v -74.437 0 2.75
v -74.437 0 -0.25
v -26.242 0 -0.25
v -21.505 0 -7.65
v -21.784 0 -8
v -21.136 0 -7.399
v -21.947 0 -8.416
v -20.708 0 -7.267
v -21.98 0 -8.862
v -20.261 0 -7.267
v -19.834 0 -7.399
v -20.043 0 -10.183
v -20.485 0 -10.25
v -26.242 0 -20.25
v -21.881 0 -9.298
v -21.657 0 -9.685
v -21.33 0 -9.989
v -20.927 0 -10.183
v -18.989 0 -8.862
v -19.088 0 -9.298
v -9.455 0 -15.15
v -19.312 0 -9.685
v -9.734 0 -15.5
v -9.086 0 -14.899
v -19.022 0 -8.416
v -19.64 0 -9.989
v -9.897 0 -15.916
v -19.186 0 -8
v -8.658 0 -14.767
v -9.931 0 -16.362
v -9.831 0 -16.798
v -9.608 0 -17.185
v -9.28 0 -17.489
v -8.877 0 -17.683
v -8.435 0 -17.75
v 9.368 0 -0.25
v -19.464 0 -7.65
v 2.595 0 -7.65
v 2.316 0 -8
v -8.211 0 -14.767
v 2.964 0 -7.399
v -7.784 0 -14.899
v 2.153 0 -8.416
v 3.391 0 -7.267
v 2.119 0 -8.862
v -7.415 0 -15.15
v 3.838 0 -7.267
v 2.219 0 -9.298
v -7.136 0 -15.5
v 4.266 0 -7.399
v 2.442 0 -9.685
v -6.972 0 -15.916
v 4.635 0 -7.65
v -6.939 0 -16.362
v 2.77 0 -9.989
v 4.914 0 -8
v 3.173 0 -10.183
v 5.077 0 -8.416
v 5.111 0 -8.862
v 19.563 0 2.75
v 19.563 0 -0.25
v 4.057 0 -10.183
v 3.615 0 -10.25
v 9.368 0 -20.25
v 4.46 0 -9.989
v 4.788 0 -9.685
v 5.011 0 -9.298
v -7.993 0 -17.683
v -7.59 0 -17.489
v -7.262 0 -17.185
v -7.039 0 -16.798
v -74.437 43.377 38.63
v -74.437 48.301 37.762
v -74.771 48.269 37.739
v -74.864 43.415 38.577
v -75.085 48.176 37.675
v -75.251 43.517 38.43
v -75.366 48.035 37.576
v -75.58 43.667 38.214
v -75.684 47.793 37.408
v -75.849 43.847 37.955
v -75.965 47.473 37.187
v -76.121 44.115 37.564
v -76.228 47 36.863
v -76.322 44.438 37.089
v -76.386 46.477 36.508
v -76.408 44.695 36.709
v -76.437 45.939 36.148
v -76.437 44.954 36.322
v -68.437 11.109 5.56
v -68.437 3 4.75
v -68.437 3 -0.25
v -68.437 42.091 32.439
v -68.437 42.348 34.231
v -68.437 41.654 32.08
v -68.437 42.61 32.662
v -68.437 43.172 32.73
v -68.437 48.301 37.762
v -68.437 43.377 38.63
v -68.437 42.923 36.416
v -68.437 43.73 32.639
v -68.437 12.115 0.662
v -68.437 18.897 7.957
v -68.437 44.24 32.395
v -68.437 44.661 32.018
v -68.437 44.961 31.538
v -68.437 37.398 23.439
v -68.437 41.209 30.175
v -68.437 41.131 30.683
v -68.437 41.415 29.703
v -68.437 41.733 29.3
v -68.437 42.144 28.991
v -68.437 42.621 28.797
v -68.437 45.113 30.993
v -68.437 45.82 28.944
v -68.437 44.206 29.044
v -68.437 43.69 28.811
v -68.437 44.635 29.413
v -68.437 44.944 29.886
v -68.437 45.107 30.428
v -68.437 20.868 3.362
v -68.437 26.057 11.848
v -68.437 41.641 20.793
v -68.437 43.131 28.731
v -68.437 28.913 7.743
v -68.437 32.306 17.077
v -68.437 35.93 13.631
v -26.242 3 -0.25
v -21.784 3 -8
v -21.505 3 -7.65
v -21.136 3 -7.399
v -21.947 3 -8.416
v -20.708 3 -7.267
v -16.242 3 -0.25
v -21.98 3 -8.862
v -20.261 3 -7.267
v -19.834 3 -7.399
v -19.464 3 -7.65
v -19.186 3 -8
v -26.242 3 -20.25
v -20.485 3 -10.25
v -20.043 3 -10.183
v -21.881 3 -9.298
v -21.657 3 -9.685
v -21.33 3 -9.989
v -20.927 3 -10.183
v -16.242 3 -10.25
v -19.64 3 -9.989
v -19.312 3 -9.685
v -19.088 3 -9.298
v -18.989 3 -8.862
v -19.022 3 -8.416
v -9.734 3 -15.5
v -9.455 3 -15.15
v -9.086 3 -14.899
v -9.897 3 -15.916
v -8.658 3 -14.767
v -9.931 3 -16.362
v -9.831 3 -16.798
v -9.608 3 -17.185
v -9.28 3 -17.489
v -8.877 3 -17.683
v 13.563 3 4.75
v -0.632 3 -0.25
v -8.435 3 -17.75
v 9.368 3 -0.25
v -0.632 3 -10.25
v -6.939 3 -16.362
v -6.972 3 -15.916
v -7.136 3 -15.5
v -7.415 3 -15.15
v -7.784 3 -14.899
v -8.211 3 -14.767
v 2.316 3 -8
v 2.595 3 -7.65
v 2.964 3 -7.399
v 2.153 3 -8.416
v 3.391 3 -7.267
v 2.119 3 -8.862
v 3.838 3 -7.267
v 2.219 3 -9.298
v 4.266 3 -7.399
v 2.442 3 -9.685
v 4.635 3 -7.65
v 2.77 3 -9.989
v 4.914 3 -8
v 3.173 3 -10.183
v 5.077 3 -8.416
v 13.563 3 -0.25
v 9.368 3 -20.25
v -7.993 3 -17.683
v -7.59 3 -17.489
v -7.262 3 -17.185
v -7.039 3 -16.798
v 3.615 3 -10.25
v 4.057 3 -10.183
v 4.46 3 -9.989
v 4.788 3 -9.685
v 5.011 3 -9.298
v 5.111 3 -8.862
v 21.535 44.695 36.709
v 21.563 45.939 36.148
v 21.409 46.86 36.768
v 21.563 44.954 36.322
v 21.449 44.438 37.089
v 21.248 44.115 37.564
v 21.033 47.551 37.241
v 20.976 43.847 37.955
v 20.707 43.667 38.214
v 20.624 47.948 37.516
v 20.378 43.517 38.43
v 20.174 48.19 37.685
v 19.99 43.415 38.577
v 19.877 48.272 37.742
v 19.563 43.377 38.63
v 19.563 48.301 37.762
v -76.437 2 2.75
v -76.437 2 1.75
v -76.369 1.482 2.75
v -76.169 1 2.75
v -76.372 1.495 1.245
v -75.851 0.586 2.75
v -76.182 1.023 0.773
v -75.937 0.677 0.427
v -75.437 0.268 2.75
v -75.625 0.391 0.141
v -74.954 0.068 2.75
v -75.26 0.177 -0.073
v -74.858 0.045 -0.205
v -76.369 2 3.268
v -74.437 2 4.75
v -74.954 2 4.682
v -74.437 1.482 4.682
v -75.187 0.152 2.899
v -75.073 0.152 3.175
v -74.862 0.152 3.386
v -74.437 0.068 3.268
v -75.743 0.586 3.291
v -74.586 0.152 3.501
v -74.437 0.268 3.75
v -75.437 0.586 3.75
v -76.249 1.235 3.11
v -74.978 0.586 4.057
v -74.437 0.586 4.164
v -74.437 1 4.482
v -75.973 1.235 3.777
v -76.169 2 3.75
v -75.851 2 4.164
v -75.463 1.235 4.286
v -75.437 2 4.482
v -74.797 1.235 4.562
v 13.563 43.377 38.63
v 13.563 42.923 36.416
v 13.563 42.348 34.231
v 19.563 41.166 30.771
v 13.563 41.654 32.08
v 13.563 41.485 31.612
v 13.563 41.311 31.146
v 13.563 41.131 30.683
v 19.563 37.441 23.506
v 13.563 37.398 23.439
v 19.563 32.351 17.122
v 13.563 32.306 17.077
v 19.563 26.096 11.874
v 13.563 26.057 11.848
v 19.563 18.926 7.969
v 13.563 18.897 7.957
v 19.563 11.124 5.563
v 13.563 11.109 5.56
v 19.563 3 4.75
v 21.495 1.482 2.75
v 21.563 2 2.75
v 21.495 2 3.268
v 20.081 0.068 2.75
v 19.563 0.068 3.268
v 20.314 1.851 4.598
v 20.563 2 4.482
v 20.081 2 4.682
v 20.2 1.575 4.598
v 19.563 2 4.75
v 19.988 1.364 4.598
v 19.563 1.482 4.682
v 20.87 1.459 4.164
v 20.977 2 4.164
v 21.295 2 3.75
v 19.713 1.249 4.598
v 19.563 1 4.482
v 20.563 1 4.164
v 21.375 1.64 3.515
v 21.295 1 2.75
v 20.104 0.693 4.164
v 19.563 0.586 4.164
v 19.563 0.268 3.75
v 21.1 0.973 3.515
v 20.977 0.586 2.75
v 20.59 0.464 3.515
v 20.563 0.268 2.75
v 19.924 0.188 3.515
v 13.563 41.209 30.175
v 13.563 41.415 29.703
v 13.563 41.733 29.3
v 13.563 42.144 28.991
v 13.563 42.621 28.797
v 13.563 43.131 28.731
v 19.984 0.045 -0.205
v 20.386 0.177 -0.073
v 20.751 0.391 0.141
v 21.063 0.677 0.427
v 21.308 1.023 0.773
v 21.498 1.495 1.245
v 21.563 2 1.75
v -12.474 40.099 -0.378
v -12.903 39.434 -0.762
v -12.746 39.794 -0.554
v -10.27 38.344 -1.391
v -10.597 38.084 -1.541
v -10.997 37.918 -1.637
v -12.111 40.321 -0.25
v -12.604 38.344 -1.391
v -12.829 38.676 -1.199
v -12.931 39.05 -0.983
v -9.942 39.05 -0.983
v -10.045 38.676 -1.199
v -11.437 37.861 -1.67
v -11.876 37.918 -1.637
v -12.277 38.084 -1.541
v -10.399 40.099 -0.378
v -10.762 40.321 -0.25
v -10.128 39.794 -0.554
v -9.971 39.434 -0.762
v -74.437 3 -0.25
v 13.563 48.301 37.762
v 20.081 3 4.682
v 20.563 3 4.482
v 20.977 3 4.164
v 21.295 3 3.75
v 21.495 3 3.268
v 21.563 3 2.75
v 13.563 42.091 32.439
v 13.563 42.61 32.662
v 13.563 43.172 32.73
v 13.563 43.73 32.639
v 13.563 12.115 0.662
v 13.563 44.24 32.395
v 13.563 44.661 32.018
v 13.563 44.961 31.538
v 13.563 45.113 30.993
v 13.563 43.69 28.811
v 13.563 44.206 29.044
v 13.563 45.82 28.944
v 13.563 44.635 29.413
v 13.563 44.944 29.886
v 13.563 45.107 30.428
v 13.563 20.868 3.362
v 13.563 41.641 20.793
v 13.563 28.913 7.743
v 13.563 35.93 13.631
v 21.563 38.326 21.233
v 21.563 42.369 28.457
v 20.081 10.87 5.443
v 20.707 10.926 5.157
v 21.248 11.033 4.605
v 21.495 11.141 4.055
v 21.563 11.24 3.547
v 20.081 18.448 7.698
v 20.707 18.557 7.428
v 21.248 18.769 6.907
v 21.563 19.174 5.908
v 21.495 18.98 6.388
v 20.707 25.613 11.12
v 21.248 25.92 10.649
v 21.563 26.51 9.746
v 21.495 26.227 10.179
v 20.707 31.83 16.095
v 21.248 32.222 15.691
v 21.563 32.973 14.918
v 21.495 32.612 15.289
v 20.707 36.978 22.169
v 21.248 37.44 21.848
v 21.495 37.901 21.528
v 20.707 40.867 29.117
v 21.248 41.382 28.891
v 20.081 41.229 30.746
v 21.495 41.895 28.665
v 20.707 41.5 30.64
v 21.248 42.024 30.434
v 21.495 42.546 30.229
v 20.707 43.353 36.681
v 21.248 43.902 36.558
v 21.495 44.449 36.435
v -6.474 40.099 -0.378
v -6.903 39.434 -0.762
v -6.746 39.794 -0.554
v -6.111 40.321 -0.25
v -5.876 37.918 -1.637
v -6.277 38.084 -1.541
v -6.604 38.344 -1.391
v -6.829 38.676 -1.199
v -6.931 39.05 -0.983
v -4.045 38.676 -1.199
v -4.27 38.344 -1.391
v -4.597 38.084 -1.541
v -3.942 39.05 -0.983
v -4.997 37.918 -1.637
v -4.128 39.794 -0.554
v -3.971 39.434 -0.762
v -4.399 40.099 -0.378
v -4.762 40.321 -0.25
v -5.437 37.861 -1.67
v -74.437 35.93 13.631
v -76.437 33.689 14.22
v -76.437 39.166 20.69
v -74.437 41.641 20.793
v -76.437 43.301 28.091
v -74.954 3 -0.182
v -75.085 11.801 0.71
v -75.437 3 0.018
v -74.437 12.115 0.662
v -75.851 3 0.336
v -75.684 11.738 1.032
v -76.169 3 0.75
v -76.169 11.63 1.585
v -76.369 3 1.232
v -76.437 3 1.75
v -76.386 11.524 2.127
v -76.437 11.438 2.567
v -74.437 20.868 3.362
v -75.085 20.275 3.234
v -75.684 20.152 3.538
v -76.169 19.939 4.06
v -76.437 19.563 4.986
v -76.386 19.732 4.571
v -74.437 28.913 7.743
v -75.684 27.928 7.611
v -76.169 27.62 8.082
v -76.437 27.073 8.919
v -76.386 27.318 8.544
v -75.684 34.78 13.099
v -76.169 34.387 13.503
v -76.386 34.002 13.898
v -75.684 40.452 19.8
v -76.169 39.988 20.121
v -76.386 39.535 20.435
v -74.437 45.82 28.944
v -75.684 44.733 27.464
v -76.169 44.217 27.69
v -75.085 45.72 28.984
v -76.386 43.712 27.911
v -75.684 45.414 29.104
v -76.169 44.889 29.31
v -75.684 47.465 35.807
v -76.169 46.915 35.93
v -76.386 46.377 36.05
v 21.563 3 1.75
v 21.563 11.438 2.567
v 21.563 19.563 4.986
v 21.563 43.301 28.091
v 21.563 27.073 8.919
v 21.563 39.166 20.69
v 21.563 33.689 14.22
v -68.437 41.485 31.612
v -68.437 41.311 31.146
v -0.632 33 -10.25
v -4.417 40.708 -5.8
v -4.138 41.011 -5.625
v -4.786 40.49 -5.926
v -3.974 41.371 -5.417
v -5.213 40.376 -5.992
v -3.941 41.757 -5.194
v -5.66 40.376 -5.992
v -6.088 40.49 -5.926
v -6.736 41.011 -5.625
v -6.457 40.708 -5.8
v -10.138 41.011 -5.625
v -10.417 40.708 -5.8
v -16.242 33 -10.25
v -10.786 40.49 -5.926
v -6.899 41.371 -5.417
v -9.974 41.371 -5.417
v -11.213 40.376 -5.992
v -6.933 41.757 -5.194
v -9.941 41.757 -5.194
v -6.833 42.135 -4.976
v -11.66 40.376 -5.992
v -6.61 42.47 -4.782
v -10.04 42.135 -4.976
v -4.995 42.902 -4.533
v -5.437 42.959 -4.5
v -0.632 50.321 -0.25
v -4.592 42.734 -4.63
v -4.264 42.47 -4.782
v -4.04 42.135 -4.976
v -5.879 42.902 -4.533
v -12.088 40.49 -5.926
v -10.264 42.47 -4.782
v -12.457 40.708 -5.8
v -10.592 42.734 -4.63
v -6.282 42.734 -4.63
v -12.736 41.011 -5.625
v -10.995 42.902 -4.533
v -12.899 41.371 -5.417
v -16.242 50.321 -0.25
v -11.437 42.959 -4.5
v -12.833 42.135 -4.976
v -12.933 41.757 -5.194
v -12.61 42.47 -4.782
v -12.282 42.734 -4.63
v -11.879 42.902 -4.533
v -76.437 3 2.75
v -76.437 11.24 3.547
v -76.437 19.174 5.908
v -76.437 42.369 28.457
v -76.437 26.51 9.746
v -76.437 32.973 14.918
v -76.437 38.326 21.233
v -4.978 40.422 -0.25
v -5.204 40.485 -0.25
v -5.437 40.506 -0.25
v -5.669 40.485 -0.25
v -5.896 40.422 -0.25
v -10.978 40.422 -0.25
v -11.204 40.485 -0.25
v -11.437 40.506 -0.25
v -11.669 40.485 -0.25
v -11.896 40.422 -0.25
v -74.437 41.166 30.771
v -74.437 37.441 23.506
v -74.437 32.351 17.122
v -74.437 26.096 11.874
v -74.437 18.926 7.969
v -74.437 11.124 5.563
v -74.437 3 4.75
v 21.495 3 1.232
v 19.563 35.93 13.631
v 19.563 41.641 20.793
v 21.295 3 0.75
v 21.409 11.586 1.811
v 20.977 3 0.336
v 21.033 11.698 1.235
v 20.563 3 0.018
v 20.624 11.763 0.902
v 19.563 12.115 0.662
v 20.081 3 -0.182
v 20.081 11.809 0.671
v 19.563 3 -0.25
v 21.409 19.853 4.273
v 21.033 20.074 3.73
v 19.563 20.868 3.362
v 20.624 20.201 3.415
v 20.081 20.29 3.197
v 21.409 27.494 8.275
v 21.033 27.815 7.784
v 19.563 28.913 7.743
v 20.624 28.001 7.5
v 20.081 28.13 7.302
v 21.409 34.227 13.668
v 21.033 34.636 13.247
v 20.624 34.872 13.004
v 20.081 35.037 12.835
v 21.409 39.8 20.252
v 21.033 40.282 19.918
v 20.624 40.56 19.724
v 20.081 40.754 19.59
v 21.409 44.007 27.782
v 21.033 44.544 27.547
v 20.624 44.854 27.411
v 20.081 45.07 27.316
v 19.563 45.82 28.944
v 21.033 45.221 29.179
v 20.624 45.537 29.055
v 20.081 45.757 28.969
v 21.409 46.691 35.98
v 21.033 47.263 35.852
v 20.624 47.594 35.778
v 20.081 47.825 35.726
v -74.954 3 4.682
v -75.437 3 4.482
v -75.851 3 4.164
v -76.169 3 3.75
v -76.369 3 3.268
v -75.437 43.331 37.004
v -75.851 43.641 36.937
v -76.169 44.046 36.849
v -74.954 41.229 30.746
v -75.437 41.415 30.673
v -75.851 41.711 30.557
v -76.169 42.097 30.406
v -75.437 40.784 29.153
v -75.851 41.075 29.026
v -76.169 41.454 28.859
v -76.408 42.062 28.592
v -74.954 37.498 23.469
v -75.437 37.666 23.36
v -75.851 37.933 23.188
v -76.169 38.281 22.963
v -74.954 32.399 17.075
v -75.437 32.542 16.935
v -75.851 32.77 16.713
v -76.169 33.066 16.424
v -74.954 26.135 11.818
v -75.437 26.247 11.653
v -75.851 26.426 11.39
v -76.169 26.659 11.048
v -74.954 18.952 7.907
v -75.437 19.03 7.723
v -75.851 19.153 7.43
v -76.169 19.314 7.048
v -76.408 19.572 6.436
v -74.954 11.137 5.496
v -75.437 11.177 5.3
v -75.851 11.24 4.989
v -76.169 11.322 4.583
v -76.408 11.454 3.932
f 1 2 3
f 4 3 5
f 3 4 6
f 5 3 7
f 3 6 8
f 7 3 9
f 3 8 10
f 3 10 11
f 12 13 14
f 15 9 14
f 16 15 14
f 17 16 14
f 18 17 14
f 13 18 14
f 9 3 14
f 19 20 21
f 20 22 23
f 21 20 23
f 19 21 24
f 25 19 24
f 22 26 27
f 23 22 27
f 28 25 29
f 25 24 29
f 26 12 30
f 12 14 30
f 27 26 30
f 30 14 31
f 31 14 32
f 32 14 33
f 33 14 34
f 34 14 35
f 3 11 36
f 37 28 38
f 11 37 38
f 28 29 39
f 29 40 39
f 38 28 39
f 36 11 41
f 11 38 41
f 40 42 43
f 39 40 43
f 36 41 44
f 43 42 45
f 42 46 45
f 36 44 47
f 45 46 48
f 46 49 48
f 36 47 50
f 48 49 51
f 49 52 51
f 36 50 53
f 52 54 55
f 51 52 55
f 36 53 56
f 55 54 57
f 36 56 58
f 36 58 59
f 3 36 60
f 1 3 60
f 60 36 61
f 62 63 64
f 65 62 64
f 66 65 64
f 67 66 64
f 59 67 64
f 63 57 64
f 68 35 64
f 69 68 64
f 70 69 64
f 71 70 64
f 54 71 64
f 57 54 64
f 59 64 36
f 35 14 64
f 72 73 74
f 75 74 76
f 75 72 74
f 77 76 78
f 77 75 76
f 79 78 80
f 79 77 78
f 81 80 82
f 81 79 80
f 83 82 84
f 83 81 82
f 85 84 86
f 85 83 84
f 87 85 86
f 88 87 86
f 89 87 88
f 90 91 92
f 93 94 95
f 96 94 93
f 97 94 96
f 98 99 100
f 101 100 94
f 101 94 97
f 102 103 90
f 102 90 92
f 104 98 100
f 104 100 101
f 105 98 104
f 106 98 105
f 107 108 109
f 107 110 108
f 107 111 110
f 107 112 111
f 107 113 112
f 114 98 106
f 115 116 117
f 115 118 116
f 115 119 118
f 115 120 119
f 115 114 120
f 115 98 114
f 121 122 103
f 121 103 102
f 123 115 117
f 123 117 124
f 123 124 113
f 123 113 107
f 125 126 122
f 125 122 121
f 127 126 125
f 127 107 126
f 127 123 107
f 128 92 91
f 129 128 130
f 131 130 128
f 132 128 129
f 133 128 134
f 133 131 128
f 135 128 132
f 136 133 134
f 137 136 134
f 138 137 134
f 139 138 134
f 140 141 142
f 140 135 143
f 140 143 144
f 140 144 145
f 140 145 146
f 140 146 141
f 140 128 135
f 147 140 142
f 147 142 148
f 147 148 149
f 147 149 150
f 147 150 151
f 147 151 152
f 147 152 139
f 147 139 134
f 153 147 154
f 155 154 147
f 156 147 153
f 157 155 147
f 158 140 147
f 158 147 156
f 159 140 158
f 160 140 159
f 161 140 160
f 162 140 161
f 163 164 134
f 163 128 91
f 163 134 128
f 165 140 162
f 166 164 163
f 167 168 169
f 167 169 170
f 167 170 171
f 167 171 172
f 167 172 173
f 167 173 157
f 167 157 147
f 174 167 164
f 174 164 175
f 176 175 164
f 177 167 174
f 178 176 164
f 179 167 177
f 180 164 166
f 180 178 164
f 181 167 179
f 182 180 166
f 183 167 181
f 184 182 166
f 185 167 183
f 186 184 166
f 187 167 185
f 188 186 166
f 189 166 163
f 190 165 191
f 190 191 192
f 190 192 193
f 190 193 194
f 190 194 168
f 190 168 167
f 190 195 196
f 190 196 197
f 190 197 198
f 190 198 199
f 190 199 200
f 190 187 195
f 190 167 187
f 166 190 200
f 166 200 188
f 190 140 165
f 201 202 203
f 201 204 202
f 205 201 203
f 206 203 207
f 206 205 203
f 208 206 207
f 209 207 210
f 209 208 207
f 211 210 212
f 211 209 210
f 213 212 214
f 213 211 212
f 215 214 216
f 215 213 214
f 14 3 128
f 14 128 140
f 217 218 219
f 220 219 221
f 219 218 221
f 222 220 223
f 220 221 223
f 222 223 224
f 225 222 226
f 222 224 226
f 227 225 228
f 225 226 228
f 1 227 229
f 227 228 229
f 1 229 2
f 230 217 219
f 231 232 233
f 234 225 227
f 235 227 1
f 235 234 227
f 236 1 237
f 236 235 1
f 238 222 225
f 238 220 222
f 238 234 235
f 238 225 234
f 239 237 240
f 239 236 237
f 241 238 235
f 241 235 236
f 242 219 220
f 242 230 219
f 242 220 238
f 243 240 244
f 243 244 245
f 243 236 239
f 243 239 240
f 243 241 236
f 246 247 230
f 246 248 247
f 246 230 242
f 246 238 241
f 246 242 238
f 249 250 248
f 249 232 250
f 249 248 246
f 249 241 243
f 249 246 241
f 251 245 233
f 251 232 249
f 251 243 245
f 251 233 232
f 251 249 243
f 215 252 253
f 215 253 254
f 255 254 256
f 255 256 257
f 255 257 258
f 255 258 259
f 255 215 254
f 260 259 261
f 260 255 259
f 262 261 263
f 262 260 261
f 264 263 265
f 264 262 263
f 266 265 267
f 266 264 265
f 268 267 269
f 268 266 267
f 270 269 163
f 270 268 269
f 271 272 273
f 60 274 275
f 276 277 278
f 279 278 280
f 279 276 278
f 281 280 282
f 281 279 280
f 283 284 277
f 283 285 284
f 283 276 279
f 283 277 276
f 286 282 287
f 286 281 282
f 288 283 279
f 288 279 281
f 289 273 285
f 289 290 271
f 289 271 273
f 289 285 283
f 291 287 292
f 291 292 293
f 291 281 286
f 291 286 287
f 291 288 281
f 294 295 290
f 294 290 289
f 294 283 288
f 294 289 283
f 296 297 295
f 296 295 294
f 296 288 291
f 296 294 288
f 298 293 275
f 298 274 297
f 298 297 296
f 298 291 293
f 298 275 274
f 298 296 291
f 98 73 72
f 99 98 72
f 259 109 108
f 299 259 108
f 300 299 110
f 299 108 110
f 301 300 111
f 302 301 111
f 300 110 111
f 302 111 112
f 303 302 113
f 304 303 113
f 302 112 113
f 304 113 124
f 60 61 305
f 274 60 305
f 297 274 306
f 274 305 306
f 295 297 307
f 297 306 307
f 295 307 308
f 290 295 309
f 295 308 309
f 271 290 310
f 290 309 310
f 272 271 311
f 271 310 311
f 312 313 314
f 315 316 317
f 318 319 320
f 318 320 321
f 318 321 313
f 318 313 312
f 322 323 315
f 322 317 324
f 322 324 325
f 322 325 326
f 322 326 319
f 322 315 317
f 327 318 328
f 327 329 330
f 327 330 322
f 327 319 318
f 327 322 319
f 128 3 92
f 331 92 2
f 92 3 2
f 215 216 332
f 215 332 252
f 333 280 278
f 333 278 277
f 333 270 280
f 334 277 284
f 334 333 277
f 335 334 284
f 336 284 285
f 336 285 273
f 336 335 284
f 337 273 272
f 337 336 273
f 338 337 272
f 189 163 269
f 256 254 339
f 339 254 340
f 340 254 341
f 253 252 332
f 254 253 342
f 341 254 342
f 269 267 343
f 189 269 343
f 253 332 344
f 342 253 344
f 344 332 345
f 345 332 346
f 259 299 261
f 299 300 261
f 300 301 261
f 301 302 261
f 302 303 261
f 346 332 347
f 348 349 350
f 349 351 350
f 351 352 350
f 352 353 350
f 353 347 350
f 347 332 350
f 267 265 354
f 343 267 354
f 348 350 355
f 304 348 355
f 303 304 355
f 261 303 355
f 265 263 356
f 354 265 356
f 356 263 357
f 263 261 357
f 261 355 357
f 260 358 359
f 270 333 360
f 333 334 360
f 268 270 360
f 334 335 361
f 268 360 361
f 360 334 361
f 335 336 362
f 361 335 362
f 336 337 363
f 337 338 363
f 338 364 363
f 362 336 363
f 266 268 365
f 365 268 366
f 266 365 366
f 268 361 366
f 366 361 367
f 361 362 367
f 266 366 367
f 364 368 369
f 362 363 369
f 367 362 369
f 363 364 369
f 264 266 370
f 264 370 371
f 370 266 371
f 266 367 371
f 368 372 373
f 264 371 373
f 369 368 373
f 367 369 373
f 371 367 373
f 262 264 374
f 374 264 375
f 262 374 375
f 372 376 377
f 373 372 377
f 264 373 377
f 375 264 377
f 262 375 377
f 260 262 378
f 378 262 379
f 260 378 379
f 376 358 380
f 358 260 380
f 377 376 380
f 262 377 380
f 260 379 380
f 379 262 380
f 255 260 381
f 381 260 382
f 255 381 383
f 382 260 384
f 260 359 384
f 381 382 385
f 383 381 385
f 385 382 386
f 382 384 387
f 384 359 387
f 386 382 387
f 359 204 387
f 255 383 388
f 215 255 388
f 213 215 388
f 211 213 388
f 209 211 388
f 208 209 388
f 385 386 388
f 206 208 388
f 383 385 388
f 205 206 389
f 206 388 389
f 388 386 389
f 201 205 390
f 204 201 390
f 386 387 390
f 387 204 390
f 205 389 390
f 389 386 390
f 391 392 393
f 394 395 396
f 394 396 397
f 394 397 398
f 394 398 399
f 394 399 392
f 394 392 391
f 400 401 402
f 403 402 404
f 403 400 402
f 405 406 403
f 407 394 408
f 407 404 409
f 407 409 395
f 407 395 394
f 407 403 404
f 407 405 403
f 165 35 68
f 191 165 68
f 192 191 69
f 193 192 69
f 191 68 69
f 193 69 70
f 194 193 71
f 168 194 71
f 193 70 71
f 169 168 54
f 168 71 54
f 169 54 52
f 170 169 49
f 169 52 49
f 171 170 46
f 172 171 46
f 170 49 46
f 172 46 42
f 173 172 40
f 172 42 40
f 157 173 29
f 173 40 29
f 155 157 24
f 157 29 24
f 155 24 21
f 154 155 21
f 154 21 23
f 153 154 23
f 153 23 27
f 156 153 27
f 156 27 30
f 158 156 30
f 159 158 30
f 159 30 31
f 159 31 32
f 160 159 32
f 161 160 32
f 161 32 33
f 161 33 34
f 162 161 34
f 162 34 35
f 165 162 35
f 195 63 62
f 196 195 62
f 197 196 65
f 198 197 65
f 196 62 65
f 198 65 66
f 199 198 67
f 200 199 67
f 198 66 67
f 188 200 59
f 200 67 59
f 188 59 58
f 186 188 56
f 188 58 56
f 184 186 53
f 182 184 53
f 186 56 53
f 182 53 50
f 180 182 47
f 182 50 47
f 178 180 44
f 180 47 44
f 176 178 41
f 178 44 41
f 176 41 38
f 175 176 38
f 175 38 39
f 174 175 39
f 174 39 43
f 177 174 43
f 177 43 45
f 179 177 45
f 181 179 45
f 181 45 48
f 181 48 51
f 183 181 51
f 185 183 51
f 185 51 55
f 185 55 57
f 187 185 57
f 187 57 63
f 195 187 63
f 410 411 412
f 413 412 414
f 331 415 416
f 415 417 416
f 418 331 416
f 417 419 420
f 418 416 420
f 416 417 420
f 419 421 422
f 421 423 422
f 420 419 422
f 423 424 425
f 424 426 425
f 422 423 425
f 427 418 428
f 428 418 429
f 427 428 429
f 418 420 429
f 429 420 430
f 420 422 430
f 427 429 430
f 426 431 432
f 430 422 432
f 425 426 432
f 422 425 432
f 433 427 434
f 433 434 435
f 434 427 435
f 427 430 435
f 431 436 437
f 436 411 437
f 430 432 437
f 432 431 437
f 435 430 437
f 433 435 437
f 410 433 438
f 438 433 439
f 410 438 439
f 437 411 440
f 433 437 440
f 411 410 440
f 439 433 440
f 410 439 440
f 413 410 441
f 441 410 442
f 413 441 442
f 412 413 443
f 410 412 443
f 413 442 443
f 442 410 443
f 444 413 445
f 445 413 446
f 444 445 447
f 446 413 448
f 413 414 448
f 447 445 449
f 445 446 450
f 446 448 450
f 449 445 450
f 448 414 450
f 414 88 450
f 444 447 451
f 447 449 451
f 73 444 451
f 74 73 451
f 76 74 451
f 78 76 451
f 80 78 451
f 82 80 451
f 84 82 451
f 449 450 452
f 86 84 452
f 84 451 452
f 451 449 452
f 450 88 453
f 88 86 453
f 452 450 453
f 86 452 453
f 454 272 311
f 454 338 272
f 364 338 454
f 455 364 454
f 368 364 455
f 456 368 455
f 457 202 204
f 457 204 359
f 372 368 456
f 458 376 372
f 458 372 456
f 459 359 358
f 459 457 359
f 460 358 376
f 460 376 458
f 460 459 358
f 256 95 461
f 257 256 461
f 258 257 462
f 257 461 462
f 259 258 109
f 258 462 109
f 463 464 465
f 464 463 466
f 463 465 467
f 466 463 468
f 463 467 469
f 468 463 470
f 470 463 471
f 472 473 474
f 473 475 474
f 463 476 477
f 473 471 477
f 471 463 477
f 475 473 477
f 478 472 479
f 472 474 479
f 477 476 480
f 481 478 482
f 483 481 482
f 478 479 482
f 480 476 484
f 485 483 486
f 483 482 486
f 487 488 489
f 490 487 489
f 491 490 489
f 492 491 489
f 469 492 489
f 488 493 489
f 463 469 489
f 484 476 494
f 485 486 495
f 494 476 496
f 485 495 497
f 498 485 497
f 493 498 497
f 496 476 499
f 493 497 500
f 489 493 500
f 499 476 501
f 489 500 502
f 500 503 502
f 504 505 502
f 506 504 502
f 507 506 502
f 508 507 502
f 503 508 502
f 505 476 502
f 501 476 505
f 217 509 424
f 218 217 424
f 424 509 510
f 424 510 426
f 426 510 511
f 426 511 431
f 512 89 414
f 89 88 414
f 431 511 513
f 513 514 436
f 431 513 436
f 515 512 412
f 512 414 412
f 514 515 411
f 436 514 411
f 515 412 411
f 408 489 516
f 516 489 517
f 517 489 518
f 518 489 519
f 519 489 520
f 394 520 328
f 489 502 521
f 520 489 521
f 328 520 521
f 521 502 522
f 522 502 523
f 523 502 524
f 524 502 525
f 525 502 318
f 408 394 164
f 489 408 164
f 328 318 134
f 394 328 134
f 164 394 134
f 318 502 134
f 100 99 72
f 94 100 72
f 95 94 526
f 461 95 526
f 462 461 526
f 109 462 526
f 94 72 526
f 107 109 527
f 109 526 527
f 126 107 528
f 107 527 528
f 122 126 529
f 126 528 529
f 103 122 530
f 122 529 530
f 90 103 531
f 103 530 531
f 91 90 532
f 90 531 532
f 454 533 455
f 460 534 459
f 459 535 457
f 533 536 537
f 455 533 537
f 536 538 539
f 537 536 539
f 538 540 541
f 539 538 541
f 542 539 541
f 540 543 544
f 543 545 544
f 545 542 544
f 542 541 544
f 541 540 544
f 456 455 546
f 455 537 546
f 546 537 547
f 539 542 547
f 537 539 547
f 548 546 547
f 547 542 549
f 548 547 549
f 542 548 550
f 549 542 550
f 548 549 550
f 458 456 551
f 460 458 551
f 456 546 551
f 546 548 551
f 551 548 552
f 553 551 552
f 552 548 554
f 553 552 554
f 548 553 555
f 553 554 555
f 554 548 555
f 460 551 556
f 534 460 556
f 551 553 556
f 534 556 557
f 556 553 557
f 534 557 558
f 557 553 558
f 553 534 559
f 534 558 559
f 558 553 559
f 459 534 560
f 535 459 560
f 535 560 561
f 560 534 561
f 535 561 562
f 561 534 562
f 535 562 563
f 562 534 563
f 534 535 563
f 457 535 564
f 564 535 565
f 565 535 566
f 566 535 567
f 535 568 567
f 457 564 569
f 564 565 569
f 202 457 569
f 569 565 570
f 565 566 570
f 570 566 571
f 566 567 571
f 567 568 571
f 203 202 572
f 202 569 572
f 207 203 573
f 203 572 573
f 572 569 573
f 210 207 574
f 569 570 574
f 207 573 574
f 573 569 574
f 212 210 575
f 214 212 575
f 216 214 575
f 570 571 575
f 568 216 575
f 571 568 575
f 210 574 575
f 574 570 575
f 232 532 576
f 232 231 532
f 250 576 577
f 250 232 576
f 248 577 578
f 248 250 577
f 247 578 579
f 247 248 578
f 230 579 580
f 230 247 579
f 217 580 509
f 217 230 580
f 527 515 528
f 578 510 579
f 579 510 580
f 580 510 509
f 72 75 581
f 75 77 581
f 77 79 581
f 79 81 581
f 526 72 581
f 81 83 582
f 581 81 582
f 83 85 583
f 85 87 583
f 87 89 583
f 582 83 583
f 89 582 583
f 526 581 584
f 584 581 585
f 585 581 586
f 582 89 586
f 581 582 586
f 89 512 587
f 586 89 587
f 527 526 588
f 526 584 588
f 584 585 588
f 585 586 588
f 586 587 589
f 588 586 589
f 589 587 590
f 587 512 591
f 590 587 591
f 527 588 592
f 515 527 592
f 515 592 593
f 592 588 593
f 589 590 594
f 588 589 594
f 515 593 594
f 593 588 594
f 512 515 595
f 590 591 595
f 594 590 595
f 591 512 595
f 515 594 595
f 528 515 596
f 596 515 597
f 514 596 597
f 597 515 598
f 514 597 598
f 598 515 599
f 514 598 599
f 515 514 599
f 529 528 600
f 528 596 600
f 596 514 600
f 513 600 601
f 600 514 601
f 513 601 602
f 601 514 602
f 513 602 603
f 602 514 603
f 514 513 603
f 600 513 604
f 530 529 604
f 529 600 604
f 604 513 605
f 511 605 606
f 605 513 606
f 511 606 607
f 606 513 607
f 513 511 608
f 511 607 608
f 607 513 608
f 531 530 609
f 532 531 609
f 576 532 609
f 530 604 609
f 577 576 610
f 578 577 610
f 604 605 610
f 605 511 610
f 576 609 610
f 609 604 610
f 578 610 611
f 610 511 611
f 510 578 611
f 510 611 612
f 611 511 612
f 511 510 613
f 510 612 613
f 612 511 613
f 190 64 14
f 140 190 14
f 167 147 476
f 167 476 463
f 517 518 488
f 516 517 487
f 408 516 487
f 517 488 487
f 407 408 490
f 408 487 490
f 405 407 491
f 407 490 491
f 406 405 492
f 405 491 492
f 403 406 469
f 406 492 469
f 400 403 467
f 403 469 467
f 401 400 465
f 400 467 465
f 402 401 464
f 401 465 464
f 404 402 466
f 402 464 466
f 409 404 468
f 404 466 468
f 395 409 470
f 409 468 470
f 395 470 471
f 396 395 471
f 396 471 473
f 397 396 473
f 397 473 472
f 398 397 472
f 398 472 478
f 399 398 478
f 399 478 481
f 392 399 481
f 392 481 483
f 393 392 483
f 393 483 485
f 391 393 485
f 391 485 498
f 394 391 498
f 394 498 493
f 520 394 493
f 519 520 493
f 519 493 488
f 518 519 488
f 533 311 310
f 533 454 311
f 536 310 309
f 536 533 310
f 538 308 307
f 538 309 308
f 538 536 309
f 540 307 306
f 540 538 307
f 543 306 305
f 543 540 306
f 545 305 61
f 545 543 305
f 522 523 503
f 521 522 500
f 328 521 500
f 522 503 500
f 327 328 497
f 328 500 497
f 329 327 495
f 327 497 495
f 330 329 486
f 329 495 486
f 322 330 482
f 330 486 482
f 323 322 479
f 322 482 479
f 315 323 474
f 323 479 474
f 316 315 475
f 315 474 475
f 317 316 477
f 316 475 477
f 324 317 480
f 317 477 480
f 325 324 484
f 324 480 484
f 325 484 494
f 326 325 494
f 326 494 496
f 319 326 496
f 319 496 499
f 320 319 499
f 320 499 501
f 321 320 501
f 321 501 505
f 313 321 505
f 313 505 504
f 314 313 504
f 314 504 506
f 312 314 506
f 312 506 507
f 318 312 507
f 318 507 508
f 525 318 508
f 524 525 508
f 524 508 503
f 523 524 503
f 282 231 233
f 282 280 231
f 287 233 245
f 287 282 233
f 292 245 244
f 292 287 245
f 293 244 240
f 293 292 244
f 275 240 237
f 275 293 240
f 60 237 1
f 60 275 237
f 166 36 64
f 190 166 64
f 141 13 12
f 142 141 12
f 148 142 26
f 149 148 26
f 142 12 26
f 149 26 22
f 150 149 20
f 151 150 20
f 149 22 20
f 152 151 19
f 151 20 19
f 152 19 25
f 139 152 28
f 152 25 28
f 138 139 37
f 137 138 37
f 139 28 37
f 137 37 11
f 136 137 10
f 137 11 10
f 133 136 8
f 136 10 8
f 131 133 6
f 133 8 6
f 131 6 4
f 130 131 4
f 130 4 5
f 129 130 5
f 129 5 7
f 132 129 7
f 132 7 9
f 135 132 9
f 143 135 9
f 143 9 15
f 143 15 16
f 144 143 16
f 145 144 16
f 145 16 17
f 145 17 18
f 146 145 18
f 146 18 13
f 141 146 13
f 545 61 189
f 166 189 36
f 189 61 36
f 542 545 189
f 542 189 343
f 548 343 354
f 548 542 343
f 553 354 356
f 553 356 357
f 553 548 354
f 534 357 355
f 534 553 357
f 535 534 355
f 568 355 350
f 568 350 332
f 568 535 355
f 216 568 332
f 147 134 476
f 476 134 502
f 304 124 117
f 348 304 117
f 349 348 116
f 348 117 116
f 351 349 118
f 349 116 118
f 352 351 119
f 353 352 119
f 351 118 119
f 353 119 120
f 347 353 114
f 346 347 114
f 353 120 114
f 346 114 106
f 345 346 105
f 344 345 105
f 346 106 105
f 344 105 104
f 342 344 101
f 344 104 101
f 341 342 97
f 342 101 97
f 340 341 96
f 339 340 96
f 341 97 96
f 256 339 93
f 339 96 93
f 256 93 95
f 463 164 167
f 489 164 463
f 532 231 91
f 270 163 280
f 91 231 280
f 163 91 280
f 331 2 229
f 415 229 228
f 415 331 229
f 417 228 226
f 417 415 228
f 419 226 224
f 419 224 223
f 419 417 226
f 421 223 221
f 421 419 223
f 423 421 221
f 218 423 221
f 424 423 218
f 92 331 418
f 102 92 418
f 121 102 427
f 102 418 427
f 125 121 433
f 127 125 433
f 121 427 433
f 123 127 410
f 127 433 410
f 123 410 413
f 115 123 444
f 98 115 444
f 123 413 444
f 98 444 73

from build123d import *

# Parameters (mm, degrees)
SKETCH1_W           = 17.805
SKETCH1_H           = 20
SKETCH1_W_2         = 38
SKETCH1_H_2         = 5
BOSS_EXTRUDE1_DEPTH = 3
SKETCH3_R           = 1.5
CUT_EXTRUDE1_DEPTH  = 5
SKETCH7_W           = 15.61
SKETCH7_H           = 10
BOSS_EXTRUDE4_DEPTH = 30
BOSS_EXTRUDE5_DEPTH = 15.61
SKETCH9_R           = 1.5
CUT_EXTRUDE2_DEPTH  = 5
BOSS_EXTRUDE6_DEPTH = 8
FILLET4_R           = 2
BOSS_EXTRUDE7_DEPTH = 82


with BuildPart() as part:
    # Sketch1 → Boss-Extrude1 (new body)
    with BuildSketch(Plane(origin=(0, 0, 0), x_dir=(1, 0, 0), z_dir=(0, 1, 0))):
        Polygon((9.368218391, 0.25), (-8.436781609, 0.25), (-26.241781609, 0.25), (-38.436781609, 0.25), (-38.436781609, -4.75), (21.563218391, -4.75), (21.563218391, 0.25), align=None)
        with Locations((0.465718391, 10.25)):
            Rectangle(SKETCH1_W, SKETCH1_H)
        with Locations((-17.339281609, 10.25)):
            Rectangle(SKETCH1_W, SKETCH1_H)
        with Locations((-57.436781609, -2.25)):
            Rectangle(SKETCH1_W_2, SKETCH1_H_2)
    extrude(amount=BOSS_EXTRUDE1_DEPTH)

    # Sketch3 → Cut-Extrude1 (cut)
    with BuildSketch(Plane.XZ):
        with Locations(Location((-20.484687418, -8.75, 0), (0, 0, 270))):
            Circle(SKETCH3_R)
        with Locations(Location((-8.434877213, -16.25, 0), (0, 0, 270))):
            Circle(SKETCH3_R)
        with Locations(Location((3.614932992, -8.75, 0), (0, 0, 270))):
            Circle(SKETCH3_R)
    extrude(amount=-CUT_EXTRUDE1_DEPTH, mode=Mode.SUBTRACT)

    # Sketch7 → Boss-Extrude4 (add)
    with BuildSketch(Plane(origin=(0, 3, 0), x_dir=(1, 0, 0), z_dir=(0, 1, 0))):
        with Locations((-8.436781609, 5.25)):
            Rectangle(SKETCH7_W, SKETCH7_H)
    extrude(amount=BOSS_EXTRUDE4_DEPTH)

    # Sketch8 → Boss-Extrude5 (add)
    with BuildSketch(Plane.ZY.offset(16.241781609)):
        Polygon((-10.25, 33), (-0.25, 50.320508076), (-0.25, 33), align=None)
    extrude(amount=-BOSS_EXTRUDE5_DEPTH)

    # Sketch9 → Cut-Extrude2 (cut)
    with BuildSketch(Plane(origin=(0, 12.688380194, -21.976919162), x_dir=(1, 0, 0), z_dir=(0, 0.4999999999999978, -0.8660254037844399))):
        with Locations(Location((-11.436781609, -33.453838325, 0), (0, 0, 270))):
            Circle(SKETCH9_R)
        with Locations(Location((-5.436781609, -33.453838325, 0), (0, 0, 270))):
            Circle(SKETCH9_R)
    extrude(amount=-CUT_EXTRUDE2_DEPTH, mode=Mode.SUBTRACT)

    # Sketch2 → Boss-Extrude6 (add)
    with BuildSketch(Plane(origin=(21.563218391, 0, 0), x_dir=(0, 0, -1), z_dir=(1, 0, 0))):
        with BuildLine():
            Line((-37.762183827, 48.301156639), (-38.630424716, 43.377117874))
            ThreePointArc((-38.630424716, 43.377117874), (-14.342177832, 29.354291997), (-4.75, 3))
            Line((-4.75, 3), (0.25, 3))
            ThreePointArc((0.25, 3), (-10.511955617, 32.568230046), (-37.762183827, 48.301156639))
        make_face()
    boss_extrude6 = extrude(amount=-BOSS_EXTRUDE6_DEPTH)

    # Mirror1: Boss-Extrude6 across plane
    add(boss_extrude6.mirror(Plane.ZY.offset(27.436781609)))

    # Fillet4
    fillet4_edges = [part.edges().sort_by_distance(p)[0] for p in [
        (-76.436781609, 29.354291997, 14.342177832),
        (-76.436781609, 32.568230046, 10.511955617),
        (-76.436781609, 45.839137256, 38.196304271),
        (21.563218391, 0, 2.25),
        (21.563218391, 1.5, 4.75),
        (21.563218391, 1.5, -0.25),
        (-76.436781609, 1.5, -0.25),
        (-76.436781609, 1.5, 4.75),
        (-76.436781609, 0, 2.25),
        (21.563218391, 29.354291997, 14.342177832),
        (-27.436781609, 0, 4.75),
        (21.563218391, 32.568230046, 10.511955617),
        (21.563218391, 45.839137256, 38.196304271),
    ]]
    fillet(fillet4_edges, radius=FILLET4_R)

    # Sketch10 → Boss-Extrude7 (add)
    with BuildSketch(Plane(origin=(-68.436781609, 0, 0), x_dir=(0, 0, -1), z_dir=(1, 0, 0))):
        with BuildLine():
            ThreePointArc((-32.079730178, 41.653896608), (-31.378929062, 41.398858318), (-30.682882682, 41.131115585))
            ThreePointArc((-30.682882682, 41.131115585), (-29.29976717, 41.733383141), (-28.730833488, 43.130540682))
            ThreePointArc((-28.730833488, 43.130540682), (-31.537743217, 44.960539777), (-32.079730178, 41.653896608))
        make_face()
    extrude(amount=BOSS_EXTRUDE7_DEPTH)


solid = part.part
